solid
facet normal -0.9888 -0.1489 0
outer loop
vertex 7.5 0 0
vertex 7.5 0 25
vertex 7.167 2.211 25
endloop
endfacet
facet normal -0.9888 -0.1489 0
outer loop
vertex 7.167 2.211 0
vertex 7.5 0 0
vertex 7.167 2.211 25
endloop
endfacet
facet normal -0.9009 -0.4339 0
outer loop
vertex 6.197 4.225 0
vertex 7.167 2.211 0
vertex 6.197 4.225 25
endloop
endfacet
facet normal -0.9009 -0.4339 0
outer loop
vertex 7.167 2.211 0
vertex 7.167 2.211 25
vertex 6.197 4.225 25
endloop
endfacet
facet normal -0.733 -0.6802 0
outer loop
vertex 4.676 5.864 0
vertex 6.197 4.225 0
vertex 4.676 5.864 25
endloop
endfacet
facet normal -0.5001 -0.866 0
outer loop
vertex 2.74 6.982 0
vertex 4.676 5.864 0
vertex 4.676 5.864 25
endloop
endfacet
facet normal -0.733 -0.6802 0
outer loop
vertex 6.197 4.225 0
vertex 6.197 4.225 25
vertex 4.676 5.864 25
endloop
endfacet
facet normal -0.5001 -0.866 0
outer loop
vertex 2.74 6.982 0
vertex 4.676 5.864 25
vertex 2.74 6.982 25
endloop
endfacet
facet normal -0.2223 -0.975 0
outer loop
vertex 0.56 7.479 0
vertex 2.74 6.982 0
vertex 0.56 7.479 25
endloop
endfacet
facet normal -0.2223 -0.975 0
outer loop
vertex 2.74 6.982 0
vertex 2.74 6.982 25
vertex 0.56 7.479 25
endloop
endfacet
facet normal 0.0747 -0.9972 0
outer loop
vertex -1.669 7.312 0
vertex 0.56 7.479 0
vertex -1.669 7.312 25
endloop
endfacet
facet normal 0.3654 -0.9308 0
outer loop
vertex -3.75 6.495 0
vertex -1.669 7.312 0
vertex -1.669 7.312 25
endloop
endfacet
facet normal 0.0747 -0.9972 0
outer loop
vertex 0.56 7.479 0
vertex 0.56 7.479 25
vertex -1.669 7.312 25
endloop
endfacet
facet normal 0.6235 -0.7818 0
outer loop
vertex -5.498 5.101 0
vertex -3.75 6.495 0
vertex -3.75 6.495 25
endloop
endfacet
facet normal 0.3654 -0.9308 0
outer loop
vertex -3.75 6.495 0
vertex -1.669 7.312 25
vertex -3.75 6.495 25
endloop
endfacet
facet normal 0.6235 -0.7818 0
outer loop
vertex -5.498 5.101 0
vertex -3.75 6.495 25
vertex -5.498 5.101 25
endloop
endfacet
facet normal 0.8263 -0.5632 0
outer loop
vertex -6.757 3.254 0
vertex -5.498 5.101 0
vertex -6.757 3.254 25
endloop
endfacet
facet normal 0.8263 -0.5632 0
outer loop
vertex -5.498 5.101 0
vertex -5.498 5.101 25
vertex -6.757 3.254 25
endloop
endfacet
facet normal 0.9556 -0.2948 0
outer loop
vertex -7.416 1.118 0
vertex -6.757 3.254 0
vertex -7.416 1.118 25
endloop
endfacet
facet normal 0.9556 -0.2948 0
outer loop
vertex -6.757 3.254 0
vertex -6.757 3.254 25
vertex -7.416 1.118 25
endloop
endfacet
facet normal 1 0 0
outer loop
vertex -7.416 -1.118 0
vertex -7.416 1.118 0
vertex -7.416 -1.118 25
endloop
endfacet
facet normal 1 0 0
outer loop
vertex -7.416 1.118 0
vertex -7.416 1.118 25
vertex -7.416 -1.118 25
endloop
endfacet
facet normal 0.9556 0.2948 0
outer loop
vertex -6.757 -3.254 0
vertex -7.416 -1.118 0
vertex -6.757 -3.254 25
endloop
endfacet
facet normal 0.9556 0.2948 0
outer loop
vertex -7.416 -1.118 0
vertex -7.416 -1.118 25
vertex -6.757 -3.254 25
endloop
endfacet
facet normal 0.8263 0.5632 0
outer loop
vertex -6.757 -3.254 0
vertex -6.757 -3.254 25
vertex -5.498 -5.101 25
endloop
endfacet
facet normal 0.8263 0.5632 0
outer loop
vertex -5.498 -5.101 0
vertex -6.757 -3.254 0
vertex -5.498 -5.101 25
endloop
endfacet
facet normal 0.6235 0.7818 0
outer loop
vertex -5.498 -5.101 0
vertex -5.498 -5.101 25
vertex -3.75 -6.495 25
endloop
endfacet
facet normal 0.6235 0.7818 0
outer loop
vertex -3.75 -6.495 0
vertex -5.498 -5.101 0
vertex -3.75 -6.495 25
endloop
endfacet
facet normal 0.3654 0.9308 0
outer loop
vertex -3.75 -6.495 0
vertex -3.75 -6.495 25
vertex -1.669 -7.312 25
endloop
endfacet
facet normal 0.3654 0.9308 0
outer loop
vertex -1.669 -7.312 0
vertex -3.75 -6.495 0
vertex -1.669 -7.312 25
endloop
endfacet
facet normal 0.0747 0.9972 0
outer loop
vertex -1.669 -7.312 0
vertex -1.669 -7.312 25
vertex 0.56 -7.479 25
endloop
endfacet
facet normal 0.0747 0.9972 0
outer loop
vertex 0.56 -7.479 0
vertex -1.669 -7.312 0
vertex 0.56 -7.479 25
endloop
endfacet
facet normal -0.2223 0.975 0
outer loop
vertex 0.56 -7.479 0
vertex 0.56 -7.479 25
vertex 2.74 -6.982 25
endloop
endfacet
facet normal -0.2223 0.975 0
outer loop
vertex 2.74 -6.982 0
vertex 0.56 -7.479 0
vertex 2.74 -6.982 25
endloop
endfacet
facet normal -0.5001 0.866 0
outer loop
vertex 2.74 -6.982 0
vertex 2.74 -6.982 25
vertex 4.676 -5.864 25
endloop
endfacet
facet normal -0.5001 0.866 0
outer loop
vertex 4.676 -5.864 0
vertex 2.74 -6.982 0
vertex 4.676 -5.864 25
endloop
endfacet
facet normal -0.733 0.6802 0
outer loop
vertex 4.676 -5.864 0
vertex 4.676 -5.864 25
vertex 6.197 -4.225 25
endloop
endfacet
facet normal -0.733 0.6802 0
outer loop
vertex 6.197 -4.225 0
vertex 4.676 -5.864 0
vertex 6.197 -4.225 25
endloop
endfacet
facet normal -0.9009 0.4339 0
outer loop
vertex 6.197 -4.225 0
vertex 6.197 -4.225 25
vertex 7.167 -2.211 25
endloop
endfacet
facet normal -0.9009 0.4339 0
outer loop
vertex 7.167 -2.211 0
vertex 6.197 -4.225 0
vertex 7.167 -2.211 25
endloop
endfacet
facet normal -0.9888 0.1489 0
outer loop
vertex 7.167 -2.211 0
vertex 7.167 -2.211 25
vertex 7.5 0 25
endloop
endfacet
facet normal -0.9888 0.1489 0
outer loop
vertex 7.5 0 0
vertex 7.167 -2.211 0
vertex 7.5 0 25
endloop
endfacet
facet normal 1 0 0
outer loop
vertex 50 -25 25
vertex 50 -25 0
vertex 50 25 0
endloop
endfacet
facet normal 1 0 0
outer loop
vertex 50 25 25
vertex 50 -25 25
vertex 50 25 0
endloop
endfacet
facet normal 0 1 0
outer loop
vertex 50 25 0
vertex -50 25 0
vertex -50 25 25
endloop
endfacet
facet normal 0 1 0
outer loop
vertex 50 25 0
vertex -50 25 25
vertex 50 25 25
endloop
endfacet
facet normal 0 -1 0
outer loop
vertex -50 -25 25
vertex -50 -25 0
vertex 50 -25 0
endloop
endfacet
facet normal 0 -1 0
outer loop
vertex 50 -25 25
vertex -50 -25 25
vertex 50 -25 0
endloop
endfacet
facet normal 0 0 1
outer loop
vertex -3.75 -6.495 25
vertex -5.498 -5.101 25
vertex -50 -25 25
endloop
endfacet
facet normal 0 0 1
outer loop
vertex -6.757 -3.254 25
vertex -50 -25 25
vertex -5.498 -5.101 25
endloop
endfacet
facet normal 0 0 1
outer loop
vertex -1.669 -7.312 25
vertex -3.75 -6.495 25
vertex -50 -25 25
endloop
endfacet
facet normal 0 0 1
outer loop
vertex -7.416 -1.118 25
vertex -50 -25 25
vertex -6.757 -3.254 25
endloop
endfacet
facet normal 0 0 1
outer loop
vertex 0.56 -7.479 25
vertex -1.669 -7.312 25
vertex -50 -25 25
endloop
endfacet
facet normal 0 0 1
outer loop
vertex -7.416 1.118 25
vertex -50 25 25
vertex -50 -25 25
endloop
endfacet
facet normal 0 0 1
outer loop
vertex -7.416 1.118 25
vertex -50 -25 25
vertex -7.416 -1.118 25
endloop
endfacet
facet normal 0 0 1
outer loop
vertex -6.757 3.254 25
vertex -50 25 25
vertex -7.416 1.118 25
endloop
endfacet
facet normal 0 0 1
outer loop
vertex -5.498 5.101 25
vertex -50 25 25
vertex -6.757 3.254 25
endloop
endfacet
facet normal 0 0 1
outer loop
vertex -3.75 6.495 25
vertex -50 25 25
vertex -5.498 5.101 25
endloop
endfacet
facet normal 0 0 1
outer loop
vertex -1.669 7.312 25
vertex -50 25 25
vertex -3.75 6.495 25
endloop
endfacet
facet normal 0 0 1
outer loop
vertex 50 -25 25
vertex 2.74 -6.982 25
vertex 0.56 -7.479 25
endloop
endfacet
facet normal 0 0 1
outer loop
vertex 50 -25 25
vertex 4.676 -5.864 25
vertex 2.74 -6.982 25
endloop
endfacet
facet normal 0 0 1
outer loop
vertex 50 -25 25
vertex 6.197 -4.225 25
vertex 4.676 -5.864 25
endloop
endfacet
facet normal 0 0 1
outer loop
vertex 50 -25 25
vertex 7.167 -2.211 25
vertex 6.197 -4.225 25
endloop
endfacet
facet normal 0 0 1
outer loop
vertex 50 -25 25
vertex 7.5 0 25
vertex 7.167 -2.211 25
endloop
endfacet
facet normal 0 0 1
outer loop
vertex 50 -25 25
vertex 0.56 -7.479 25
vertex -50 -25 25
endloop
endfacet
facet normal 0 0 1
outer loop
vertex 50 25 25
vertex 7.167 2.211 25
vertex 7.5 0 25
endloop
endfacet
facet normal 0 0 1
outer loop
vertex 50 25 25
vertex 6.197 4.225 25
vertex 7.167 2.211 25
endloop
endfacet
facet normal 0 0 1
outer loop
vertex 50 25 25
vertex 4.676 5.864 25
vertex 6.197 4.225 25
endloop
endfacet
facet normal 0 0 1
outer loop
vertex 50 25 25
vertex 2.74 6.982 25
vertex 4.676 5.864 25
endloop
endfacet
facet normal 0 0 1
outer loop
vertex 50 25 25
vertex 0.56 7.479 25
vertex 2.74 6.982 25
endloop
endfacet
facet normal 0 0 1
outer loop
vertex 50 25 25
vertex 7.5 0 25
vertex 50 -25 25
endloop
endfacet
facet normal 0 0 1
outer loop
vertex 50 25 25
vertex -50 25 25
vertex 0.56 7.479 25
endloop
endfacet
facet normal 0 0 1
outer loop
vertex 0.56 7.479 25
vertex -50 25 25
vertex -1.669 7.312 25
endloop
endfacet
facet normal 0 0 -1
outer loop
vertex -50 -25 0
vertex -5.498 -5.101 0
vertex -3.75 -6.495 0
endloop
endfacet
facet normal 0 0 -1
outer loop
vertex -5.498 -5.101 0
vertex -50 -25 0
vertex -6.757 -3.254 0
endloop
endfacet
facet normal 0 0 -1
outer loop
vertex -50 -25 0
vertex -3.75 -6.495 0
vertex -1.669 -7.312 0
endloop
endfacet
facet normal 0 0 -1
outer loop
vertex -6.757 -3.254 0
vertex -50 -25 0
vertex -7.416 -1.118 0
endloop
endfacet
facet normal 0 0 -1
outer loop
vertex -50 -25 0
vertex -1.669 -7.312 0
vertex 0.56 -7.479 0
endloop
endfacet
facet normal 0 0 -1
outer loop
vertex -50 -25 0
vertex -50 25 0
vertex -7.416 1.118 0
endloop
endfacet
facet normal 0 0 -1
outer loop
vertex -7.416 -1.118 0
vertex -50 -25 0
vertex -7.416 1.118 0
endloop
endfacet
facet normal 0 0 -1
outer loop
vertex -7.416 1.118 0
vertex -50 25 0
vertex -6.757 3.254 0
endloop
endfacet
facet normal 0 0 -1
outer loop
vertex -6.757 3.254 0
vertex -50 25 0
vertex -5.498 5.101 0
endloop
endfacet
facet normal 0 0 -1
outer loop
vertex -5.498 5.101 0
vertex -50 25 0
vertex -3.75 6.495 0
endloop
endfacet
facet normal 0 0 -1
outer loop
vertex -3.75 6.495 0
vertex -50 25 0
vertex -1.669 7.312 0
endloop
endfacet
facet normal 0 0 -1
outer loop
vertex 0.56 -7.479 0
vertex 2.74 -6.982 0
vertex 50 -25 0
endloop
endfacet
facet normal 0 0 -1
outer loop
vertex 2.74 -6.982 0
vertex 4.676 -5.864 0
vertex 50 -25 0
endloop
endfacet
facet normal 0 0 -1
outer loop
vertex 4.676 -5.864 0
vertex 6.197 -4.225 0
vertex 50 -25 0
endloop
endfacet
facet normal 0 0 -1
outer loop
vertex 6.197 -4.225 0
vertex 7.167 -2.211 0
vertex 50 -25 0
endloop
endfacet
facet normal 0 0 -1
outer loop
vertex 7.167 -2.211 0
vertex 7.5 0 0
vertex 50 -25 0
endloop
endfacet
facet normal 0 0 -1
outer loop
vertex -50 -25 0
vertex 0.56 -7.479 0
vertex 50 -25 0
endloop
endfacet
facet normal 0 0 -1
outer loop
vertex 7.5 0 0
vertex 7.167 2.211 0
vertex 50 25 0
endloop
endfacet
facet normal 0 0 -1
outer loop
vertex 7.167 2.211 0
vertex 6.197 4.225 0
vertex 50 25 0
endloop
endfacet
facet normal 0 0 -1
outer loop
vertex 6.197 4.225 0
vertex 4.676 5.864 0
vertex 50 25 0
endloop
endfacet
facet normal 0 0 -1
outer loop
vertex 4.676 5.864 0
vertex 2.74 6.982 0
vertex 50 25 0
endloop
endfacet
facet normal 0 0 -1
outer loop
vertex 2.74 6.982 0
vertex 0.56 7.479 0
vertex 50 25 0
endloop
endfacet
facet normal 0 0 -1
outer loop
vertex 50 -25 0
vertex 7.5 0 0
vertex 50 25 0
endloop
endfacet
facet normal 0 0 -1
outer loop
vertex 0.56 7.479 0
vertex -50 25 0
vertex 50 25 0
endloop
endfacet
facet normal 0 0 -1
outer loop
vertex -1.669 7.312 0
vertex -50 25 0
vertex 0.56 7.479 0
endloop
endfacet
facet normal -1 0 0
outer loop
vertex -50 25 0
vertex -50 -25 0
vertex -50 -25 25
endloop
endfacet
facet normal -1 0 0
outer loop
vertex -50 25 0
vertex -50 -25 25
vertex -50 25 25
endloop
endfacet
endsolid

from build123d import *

# Parameters (mm, degrees)
SKICA1_W                 = 100
SKICA1_H                 = 50
P_IDAT_VYSUNUT_M1_DEPTH  = 25
ODEBRAT_VYSUNUT_M1_REACH = 27
SKICA2_R                 = 7.5


with BuildPart() as part:
    # Skica1 → Přidat vysunutím1 (new body)
    with BuildSketch(Plane.XY):
        Rectangle(SKICA1_W, SKICA1_H)
    extrude(amount=P_IDAT_VYSUNUT_M1_DEPTH)

    # Skica2 → Odebrat vysunutím1 (cut, up to next)
    with BuildSketch(Plane.XY.offset(25), mode=Mode.PRIVATE) as odebrat_vysunut_m1_sk1:
        Circle(SKICA2_R)
    odebrat_vysunut_m1_tool1 = extrude(odebrat_vysunut_m1_sk1.sketch, amount=-ODEBRAT_VYSUNUT_M1_REACH, mode=Mode.PRIVATE) & part.part
    add(odebrat_vysunut_m1_tool1.solids().sort_by_distance((0, 0, 25))[0], mode=Mode.SUBTRACT)


solid = part.part
